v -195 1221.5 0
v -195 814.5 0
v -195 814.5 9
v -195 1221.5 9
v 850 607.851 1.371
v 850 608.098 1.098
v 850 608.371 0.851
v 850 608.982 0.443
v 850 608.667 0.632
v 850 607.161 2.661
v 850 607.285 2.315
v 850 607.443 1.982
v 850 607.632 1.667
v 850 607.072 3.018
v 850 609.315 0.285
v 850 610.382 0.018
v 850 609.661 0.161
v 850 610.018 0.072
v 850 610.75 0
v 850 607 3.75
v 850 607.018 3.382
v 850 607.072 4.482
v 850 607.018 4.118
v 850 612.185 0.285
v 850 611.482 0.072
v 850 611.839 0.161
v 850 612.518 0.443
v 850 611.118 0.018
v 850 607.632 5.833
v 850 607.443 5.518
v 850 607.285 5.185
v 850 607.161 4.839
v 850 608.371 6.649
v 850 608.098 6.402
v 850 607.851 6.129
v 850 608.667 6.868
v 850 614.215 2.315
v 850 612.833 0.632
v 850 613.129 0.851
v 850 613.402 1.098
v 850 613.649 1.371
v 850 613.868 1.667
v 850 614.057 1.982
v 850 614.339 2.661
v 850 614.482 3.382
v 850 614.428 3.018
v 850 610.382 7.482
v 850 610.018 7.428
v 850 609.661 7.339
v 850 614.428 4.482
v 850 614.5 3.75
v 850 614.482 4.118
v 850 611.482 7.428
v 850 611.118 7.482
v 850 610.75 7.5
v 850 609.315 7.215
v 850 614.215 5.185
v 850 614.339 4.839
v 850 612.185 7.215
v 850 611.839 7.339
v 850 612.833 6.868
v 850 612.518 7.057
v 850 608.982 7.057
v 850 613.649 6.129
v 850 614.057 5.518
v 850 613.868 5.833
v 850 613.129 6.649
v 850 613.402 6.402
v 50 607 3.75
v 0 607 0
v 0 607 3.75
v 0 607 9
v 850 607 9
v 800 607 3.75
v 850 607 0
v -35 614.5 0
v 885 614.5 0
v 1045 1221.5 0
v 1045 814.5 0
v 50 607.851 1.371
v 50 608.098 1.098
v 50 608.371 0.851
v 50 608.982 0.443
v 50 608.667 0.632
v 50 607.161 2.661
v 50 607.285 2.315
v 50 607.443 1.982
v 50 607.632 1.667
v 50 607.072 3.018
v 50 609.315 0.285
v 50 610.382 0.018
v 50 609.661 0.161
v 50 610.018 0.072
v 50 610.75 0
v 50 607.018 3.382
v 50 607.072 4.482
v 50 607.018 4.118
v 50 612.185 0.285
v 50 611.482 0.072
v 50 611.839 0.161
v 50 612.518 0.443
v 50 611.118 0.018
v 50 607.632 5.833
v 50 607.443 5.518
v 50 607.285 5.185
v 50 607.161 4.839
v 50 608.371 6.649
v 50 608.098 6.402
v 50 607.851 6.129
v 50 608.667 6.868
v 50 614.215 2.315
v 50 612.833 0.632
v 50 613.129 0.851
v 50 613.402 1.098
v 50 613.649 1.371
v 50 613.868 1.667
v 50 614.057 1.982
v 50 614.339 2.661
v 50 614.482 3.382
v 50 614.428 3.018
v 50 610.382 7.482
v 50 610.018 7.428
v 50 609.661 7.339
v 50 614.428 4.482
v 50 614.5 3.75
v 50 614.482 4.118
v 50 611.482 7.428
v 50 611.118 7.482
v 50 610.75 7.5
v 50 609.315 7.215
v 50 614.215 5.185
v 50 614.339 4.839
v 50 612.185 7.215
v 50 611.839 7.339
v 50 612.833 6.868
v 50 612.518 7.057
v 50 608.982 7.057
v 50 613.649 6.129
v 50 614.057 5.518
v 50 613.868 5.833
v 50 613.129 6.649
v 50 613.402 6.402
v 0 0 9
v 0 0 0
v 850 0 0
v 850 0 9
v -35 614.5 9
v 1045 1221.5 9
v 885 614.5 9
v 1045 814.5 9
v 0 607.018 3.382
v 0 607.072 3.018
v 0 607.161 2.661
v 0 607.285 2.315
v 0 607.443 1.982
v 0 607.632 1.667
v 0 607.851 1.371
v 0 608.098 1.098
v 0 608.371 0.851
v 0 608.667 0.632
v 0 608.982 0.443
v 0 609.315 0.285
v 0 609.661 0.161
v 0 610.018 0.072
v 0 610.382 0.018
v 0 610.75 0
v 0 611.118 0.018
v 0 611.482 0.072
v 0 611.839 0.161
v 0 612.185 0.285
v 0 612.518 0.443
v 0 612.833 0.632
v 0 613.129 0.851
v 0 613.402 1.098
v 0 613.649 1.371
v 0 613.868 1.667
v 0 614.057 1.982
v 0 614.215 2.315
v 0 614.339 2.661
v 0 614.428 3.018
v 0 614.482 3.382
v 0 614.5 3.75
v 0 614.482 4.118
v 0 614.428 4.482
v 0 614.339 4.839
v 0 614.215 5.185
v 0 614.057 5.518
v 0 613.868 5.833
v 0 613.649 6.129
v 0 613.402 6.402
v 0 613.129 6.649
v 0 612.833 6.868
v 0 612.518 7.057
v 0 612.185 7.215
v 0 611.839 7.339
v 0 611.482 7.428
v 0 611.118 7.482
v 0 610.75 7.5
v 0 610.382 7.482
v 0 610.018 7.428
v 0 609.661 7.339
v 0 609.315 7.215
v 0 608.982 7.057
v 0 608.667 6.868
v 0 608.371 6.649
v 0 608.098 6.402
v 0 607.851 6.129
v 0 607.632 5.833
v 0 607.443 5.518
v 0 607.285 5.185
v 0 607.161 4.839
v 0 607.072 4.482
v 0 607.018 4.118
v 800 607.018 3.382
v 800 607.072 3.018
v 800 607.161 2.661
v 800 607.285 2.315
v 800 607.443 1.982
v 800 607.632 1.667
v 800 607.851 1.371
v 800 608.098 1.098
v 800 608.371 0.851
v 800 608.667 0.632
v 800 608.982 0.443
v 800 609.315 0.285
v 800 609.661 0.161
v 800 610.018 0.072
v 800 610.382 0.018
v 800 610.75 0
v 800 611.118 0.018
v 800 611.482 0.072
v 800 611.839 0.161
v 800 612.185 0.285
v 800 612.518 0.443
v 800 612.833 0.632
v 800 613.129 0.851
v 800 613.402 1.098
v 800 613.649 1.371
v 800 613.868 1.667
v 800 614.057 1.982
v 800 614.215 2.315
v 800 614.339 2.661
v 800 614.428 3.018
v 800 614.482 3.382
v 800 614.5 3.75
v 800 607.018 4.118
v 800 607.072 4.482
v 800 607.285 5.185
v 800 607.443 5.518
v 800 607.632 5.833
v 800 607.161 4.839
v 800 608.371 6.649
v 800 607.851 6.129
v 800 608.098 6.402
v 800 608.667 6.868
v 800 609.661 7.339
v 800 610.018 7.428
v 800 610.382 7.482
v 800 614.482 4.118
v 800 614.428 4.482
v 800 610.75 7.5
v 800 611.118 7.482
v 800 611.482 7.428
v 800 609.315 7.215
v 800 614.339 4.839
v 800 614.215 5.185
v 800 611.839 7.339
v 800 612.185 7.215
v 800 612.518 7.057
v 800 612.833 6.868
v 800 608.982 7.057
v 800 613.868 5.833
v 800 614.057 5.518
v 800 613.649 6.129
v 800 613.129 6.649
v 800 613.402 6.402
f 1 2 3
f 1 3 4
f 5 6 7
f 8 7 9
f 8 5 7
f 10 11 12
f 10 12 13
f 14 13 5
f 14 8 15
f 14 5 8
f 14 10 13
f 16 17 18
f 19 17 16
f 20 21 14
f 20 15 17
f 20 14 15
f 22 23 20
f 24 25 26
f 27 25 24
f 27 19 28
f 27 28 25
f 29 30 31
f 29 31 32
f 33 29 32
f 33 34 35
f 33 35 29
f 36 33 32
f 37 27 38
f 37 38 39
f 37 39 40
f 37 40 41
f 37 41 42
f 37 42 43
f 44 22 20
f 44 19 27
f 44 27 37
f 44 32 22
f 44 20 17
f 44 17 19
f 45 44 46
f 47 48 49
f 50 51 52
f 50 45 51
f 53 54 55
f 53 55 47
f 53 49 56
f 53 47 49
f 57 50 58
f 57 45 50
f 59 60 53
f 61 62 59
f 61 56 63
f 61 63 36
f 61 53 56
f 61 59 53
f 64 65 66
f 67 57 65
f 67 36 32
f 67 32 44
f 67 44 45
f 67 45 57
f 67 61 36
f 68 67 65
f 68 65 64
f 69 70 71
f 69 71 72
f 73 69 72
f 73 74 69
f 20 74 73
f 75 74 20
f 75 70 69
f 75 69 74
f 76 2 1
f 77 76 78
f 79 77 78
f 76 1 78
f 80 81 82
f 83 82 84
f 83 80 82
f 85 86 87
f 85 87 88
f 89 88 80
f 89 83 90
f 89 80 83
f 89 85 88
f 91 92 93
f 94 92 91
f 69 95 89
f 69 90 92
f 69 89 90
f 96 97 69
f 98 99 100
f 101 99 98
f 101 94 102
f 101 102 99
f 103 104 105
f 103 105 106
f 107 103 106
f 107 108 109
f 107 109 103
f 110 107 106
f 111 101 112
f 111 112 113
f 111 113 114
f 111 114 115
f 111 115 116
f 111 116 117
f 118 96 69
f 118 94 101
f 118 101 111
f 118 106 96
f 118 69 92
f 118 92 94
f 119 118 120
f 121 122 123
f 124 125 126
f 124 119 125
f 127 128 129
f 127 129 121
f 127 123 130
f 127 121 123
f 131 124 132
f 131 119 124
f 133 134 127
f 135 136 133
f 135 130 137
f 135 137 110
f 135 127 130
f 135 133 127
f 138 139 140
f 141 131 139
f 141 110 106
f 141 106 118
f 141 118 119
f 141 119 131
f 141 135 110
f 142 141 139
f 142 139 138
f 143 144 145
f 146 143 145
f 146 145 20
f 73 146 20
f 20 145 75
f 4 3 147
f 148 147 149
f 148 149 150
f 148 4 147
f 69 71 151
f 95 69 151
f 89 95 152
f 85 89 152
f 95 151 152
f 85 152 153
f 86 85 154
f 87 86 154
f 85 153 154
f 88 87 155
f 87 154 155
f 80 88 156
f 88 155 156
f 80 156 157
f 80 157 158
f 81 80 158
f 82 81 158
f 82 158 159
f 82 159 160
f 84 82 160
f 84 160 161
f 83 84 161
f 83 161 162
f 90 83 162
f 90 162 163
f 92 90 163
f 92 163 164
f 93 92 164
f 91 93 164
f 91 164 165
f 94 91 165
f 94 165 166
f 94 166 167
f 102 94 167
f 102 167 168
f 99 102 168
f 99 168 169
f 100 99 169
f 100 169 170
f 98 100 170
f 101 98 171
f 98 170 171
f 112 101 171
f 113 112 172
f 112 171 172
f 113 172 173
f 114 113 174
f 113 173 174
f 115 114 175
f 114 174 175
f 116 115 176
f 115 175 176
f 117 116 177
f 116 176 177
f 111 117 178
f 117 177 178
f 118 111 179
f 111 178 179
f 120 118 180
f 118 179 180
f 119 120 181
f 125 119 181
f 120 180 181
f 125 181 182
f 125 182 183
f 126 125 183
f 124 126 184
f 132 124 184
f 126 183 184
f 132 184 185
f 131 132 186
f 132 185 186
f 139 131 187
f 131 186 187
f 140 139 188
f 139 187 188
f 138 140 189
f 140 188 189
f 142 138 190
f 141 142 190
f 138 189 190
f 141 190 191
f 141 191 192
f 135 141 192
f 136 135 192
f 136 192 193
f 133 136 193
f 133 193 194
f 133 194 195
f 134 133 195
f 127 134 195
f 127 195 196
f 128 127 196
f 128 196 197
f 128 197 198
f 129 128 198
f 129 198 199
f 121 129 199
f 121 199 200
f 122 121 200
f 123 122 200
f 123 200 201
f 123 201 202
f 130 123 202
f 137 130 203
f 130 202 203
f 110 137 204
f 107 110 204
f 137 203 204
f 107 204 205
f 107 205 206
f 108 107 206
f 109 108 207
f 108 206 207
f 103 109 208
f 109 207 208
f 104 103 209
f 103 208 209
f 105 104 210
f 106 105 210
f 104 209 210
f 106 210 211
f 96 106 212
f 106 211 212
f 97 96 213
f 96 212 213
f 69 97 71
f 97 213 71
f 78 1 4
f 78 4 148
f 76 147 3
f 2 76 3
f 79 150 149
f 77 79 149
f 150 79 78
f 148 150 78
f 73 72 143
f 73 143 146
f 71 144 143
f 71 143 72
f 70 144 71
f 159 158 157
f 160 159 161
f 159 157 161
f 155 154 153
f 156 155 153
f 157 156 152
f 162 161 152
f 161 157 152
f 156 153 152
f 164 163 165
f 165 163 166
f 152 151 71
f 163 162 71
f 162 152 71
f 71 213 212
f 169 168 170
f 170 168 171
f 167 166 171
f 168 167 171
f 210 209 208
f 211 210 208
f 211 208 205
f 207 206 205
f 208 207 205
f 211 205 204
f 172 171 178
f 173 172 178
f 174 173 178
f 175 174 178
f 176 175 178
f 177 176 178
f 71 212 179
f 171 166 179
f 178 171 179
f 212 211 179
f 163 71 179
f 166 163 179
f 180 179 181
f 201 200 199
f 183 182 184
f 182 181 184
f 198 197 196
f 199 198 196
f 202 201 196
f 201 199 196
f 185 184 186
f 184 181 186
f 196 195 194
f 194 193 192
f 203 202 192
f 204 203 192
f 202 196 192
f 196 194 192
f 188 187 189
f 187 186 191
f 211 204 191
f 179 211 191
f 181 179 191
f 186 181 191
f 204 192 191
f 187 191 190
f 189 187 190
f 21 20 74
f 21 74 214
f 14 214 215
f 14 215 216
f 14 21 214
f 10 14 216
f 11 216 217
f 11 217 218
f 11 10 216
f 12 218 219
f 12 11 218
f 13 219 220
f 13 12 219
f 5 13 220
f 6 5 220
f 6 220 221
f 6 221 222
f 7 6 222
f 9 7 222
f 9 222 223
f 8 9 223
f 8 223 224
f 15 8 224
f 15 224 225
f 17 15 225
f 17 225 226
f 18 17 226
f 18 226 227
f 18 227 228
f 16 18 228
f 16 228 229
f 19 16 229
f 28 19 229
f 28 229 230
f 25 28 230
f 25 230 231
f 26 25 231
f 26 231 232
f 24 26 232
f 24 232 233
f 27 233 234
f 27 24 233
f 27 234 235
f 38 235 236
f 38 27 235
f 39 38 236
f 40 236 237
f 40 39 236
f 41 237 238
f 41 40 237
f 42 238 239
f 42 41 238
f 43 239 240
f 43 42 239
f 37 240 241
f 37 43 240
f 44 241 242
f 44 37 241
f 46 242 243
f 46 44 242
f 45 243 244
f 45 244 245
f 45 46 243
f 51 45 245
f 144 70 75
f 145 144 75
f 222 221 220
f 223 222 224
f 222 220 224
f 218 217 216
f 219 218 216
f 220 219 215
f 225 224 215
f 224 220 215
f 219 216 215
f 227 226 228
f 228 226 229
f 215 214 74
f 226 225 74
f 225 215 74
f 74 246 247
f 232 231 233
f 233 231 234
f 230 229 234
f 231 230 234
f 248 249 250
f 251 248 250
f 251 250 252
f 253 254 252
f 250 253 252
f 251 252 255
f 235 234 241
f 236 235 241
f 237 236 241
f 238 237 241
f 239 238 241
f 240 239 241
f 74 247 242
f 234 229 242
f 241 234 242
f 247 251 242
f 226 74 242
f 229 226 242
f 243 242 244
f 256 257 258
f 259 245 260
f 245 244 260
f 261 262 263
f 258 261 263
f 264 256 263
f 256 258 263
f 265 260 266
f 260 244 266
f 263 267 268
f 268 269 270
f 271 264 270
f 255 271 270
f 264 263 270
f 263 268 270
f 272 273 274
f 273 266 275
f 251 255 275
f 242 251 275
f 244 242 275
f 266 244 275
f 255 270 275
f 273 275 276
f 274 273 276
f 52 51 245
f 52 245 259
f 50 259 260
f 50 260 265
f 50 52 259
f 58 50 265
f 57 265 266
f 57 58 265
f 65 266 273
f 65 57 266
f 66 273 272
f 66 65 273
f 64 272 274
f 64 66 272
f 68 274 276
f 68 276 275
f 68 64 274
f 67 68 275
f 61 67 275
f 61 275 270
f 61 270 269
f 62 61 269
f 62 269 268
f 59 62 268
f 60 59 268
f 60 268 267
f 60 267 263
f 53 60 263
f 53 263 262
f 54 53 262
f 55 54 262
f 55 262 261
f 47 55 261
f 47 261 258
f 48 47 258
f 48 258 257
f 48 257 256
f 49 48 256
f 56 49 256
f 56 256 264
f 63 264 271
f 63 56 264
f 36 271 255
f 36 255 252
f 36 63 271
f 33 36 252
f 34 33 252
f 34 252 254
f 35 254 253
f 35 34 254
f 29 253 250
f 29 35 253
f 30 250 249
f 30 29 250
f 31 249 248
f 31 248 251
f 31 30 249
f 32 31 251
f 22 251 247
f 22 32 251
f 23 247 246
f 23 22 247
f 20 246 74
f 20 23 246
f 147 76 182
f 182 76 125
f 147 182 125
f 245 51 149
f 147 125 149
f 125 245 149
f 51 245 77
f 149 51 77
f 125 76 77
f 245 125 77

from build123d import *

# Parameters (mm, degrees)
F0_W     = 850
F0_H     = 607
F1_DEPTH = 9
F2_W     = 1240
F2_H     = 607
F3_DEPTH = 9
F5_DEPTH = 9
F6_R     = 3.75
F7_DEPTH = 50


with BuildPart() as f1:
    # F0 (on Top) → F1 (new body)
    with BuildSketch(Plane.XY):
        with Locations((425, 303.5)):
            Rectangle(F0_W, F0_H)
    extrude(amount=F1_DEPTH)



with BuildPart() as f3:
    # F2 (on Top) → F3 (new body)
    with BuildSketch(Plane.XY):
        with Locations((425, 918)):
            Rectangle(F2_W, F2_H)
    extrude(amount=F3_DEPTH)

    # F4 (on face) → F5 (cut)
    with BuildSketch(Plane.XY.offset(9)):
        Polygon((-195, 814.5), (-195, 614.5), (-35, 614.5), align=None)
        Polygon((885, 614.5), (1045, 614.5), (1045, 814.5), align=None)
    extrude(amount=-F5_DEPTH, mode=Mode.SUBTRACT)


with BuildPart() as f1_1:
    add(f1.part)

    add(f3.part)  # F7 merges F3
    # F6 (on face) → F7 (join)
    with BuildSketch(Plane.YZ.offset(850)):
        with Locations((610.75, 3.75)):
            Circle(F6_R)
    extrude(amount=-F7_DEPTH)

    # F9: F1 across plane


with BuildPart() as f1_2:
    add(f1_1.part)
    add(f1_1.part.mirror(Plane(origin=(425, 303.5, 4.5), x_dir=(0, 1, 0), z_dir=(1, 0, 0))))


solid = f1_2.part
